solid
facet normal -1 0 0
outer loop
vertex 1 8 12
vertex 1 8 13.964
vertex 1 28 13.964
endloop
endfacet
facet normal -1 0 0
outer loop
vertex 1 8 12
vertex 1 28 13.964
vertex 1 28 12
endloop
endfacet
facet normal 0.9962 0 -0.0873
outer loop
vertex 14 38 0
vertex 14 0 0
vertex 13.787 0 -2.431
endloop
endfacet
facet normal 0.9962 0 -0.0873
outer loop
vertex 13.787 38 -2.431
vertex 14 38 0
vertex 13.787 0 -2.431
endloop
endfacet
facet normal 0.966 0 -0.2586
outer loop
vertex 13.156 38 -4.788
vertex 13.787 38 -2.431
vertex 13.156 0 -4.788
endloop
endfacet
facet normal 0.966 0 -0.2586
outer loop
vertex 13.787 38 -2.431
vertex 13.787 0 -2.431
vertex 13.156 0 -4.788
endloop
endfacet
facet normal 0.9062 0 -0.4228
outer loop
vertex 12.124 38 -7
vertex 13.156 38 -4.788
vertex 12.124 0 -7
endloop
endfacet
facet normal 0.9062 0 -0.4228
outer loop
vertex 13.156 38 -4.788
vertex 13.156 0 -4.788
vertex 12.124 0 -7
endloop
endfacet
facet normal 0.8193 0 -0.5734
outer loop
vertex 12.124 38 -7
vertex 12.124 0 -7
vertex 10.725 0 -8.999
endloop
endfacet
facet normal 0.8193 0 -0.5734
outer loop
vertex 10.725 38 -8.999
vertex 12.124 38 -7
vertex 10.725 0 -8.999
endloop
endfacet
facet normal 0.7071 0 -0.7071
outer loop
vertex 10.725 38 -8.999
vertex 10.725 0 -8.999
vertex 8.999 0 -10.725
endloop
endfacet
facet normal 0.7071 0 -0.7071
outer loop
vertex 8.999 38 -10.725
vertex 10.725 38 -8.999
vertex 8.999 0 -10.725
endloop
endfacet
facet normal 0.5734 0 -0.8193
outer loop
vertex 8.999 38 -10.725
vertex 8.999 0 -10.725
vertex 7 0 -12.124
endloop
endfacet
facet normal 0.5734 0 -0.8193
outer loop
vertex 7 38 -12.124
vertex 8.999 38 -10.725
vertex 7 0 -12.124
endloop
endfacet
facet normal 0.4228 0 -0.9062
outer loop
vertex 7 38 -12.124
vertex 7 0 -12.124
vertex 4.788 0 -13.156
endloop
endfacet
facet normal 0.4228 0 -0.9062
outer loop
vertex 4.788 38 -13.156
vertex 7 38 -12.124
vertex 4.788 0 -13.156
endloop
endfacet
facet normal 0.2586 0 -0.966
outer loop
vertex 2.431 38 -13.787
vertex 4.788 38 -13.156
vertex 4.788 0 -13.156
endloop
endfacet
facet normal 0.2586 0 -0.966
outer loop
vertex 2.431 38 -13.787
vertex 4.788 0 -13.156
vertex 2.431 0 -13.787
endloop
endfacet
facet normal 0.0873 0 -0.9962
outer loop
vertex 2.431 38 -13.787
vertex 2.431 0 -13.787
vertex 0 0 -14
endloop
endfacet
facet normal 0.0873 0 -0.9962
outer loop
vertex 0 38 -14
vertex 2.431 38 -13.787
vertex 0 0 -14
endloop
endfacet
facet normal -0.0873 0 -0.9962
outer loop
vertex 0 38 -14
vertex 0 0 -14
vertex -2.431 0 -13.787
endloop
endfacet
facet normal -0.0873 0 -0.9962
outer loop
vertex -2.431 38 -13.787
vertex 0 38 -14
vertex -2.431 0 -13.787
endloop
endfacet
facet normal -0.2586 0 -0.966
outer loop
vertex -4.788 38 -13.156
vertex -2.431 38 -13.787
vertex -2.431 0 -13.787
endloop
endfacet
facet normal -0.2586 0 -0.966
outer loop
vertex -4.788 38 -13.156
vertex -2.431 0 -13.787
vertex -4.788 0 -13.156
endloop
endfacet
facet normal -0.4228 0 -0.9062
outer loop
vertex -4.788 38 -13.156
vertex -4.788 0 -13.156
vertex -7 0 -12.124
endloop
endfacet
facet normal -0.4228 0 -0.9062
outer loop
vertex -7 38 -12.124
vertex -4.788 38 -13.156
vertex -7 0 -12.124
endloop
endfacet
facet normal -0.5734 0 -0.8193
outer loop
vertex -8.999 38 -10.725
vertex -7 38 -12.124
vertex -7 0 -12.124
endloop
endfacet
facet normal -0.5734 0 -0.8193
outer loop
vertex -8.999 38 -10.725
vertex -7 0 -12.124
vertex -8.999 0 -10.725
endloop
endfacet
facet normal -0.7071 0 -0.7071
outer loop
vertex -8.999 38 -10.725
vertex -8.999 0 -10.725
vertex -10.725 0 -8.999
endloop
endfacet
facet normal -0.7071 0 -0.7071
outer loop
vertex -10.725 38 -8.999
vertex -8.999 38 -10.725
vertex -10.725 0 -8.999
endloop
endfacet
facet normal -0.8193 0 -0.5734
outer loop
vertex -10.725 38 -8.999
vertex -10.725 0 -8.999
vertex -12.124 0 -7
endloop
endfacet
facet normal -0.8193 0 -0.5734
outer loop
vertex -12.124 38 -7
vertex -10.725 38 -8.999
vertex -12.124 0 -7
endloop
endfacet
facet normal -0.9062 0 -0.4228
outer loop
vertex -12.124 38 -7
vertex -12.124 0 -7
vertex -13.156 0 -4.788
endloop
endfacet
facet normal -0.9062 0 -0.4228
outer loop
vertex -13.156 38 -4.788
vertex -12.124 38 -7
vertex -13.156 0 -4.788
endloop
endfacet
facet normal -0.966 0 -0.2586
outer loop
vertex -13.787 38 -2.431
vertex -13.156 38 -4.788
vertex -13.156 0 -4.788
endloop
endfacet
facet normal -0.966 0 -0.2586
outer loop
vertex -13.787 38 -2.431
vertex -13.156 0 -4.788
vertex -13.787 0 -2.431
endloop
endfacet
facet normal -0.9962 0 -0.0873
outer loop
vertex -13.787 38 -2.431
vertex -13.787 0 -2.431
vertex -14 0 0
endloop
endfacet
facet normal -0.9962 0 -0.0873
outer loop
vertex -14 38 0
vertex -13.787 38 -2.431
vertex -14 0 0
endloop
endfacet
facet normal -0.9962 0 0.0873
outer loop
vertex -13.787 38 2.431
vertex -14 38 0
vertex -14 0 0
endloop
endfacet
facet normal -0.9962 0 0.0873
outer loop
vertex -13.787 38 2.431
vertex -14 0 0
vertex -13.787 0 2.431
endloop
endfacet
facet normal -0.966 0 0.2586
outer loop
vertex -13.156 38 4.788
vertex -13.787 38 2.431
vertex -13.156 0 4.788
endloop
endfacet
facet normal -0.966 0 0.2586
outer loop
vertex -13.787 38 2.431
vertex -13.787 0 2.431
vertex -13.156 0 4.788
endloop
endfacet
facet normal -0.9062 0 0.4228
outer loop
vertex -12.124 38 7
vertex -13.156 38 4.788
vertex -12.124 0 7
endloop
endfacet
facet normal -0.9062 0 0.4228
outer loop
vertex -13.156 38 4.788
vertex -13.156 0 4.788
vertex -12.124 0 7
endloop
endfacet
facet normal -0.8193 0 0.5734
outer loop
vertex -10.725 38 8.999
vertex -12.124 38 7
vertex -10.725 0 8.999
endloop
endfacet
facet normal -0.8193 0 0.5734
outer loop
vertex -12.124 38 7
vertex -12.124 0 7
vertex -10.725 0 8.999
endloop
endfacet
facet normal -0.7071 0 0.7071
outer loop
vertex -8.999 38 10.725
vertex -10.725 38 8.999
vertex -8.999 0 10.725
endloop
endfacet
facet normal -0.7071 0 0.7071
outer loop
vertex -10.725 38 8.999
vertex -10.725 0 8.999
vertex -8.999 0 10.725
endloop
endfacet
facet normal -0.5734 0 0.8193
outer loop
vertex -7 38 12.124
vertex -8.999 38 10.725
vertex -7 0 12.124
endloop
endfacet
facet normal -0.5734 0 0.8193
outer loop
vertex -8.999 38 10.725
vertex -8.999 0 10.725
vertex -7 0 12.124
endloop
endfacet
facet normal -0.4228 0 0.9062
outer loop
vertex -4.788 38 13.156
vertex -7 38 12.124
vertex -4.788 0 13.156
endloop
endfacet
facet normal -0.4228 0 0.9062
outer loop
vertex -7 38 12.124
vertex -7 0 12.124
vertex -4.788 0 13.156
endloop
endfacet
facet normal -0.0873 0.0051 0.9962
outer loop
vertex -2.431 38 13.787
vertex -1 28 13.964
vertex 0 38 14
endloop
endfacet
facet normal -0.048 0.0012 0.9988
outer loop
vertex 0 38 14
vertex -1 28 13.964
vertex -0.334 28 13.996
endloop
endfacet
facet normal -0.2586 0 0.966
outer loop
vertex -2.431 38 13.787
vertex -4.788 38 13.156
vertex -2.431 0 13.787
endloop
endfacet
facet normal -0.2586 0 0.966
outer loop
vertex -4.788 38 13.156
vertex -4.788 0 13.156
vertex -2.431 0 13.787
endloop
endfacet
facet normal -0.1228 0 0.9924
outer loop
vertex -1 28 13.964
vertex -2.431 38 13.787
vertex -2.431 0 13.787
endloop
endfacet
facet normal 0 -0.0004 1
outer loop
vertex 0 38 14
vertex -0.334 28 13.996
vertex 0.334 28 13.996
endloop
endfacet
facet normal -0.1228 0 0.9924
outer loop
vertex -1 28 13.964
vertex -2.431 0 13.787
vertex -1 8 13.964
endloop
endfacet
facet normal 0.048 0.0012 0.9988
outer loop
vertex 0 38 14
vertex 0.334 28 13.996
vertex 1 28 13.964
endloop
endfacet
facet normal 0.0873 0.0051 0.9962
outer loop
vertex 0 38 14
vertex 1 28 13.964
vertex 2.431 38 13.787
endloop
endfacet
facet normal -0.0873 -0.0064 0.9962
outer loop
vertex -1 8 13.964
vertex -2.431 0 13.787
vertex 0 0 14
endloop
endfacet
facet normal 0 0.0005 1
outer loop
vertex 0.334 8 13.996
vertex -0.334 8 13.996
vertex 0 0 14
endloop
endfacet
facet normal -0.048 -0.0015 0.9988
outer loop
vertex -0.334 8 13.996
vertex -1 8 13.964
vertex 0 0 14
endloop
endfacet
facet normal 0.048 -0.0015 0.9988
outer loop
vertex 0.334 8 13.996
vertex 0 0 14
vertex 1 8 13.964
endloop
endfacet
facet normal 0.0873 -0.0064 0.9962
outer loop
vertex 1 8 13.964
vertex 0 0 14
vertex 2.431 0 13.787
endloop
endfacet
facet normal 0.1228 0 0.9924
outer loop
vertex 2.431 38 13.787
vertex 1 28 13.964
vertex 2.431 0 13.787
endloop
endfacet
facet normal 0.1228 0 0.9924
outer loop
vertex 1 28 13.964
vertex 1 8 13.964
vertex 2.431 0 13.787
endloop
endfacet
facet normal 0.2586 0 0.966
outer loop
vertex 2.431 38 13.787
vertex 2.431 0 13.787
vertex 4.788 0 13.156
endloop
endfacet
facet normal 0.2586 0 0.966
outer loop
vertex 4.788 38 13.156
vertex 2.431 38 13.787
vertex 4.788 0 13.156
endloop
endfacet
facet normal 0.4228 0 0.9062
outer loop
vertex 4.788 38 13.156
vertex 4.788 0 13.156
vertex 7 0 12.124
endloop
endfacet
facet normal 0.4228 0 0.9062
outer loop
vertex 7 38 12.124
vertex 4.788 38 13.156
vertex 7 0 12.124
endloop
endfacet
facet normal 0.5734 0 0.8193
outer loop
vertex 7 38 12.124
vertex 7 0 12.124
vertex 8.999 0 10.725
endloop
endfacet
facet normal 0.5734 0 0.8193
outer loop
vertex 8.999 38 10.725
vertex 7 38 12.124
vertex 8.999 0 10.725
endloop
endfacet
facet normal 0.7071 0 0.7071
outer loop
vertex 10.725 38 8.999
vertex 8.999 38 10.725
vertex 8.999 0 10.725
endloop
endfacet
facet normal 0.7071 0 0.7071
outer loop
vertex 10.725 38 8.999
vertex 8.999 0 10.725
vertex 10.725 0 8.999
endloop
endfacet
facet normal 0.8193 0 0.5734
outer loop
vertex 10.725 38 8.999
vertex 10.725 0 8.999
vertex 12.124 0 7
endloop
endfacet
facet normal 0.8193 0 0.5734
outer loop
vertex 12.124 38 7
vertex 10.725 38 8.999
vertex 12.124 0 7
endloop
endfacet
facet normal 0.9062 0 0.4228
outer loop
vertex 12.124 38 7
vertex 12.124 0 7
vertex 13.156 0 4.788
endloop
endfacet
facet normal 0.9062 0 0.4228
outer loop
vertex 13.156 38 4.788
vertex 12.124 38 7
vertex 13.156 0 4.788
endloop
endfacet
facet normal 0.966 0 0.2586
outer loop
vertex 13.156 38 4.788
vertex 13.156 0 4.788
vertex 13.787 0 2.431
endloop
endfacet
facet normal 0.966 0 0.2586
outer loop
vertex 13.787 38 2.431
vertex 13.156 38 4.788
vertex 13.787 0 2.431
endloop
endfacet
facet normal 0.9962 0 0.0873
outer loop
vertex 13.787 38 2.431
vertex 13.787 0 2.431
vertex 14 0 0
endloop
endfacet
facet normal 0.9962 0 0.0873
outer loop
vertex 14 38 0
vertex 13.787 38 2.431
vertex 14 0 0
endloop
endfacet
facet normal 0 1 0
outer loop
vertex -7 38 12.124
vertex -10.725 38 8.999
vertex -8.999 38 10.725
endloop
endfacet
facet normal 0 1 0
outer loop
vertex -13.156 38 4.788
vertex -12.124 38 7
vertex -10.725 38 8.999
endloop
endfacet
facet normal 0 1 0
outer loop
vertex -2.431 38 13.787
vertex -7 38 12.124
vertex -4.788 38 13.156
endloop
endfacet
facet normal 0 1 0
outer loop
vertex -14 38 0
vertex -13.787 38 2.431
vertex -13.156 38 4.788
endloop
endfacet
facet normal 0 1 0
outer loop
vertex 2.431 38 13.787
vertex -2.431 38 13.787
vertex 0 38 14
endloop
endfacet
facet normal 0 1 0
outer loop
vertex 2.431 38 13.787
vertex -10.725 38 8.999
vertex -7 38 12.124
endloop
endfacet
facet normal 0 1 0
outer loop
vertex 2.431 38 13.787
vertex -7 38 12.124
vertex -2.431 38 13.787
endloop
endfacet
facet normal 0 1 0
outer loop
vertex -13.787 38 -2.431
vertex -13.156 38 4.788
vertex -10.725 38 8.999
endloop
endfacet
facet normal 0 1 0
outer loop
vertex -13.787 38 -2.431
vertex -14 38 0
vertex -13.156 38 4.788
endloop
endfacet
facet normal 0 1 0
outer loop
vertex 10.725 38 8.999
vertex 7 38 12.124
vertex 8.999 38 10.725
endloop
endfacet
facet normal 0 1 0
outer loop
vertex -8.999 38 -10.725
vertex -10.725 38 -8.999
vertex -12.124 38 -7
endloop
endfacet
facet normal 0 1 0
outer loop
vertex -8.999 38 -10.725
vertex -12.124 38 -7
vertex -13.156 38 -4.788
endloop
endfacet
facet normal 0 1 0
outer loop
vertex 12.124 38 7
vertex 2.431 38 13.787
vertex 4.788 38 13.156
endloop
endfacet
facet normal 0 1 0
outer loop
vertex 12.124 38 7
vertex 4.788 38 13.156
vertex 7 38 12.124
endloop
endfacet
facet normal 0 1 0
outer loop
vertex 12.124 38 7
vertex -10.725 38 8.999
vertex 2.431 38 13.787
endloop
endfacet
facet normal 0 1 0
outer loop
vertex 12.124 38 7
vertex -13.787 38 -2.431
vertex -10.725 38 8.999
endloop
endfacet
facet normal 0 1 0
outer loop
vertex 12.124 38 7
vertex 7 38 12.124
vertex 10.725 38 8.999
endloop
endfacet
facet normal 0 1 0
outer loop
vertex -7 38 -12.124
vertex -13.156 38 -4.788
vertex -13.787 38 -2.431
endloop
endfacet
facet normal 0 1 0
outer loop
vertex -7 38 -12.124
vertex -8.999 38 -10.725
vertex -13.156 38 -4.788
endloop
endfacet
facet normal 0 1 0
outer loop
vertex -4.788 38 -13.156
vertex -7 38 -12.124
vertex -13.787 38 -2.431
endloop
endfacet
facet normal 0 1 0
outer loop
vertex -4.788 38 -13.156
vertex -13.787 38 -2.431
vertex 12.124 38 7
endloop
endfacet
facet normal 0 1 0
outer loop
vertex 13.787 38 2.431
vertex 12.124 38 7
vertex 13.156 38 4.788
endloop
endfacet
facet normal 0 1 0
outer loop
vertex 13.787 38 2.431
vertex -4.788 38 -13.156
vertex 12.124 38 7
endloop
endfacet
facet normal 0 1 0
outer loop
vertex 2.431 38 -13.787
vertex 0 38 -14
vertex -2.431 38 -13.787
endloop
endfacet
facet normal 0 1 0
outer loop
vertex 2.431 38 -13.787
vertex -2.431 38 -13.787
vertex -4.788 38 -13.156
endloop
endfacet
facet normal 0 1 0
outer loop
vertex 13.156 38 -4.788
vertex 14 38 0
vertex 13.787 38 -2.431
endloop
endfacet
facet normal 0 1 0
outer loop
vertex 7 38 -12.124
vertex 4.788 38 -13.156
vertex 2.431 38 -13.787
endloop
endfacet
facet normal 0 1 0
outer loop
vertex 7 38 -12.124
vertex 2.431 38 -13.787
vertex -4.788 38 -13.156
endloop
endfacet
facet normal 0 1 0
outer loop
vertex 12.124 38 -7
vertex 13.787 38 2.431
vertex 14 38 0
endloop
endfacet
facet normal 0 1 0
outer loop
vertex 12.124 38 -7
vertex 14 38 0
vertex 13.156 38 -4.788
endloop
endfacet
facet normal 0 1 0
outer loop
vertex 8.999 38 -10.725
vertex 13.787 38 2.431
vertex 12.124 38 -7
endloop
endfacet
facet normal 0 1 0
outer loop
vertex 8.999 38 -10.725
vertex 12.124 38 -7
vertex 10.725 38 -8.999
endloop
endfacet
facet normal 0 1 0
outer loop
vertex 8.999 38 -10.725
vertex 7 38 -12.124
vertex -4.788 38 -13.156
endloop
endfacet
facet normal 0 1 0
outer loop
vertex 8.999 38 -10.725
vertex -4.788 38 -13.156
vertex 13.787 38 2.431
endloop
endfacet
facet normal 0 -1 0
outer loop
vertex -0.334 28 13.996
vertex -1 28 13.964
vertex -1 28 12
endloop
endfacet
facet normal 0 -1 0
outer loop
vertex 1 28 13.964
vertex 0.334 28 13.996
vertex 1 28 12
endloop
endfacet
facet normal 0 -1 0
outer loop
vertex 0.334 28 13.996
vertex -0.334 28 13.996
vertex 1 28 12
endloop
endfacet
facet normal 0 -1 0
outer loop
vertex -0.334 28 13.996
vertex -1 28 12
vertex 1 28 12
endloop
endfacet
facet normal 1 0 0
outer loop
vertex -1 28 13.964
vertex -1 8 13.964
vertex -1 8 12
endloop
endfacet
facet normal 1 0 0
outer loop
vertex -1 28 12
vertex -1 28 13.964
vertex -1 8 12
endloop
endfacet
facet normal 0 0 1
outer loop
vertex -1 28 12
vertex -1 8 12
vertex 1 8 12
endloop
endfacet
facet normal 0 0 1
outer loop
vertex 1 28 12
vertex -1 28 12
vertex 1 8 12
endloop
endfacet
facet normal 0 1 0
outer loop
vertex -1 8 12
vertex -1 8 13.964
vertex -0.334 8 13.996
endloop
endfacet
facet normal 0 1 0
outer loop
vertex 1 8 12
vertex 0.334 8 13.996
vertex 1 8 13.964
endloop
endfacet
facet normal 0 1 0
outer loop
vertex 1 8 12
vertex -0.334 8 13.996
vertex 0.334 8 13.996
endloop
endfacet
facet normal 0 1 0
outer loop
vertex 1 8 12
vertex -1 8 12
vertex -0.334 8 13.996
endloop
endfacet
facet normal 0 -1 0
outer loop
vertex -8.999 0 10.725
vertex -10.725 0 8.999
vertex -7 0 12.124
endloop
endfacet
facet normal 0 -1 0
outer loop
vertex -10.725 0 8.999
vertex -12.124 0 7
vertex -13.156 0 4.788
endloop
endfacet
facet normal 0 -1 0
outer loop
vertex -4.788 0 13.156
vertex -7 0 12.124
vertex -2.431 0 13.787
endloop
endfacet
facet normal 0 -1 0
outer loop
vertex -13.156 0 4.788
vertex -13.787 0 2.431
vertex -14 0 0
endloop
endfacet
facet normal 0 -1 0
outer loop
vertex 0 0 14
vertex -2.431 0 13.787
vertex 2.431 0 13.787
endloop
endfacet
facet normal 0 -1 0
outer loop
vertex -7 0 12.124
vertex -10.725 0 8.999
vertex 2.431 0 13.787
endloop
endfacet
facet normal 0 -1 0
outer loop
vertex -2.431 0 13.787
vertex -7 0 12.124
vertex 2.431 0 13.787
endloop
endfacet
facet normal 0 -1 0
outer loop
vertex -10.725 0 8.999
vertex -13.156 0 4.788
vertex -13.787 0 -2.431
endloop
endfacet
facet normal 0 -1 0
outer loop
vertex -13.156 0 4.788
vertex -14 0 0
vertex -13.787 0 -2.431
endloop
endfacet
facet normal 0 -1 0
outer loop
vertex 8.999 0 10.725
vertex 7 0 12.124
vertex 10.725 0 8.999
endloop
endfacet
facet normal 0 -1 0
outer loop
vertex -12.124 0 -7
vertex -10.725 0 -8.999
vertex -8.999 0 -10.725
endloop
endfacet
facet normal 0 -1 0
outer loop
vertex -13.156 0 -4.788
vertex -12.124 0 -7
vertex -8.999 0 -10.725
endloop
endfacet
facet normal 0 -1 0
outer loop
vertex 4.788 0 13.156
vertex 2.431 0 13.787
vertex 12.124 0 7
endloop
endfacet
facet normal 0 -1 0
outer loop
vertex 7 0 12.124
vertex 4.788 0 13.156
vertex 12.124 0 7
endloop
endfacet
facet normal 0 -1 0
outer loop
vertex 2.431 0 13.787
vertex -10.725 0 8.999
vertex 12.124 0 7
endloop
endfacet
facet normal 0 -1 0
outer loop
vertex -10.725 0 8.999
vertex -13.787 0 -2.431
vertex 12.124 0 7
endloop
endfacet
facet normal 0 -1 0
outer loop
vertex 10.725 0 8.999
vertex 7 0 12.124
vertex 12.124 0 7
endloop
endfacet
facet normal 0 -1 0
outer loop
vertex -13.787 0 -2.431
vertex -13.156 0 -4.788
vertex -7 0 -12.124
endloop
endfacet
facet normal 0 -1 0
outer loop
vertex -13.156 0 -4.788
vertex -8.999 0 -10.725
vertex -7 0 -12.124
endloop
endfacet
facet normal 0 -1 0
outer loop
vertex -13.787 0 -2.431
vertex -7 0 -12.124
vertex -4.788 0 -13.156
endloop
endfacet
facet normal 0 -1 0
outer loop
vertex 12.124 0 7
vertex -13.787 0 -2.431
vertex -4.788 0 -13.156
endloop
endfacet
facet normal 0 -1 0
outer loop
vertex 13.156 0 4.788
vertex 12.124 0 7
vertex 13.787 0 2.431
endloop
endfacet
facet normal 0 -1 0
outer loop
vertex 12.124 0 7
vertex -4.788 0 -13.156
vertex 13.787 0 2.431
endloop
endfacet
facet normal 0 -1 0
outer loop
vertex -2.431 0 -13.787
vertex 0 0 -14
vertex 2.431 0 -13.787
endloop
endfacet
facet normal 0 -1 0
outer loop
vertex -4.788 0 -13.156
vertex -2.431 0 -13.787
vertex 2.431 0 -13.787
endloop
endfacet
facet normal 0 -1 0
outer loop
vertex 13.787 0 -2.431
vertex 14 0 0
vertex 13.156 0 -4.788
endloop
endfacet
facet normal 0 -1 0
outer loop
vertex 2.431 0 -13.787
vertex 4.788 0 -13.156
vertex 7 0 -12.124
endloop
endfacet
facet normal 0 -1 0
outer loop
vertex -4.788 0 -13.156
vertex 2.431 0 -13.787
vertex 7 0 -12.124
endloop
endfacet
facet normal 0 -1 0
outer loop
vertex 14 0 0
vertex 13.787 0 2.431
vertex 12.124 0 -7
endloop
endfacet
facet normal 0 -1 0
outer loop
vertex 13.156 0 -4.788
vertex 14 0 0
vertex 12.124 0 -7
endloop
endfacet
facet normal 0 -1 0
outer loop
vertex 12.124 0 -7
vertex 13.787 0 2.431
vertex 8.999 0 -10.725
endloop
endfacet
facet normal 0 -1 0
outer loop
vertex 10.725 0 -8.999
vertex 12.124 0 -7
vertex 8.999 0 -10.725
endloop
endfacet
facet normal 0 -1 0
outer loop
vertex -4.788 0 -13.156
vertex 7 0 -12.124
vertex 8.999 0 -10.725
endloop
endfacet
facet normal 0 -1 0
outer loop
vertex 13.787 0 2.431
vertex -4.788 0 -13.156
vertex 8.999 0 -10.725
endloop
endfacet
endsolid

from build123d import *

# Parameters (mm, degrees)
SKETCH1_R           = 14
BOSS_EXTRUDE1_DEPTH = 38
CUT_EXTRUDE1_START  = 8
SKETCH2_W           = 2
SKETCH2_H           = 3
CUT_EXTRUDE1_DEPTH  = 20


with BuildPart() as part:
    # Sketch1 → Boss-Extrude1 (new body)
    with BuildSketch(Plane(origin=(0, 0, 0), x_dir=(1, 0, 0), z_dir=(0, 1, 0))):
        Circle(SKETCH1_R)
    extrude(amount=BOSS_EXTRUDE1_DEPTH)

    # Sketch2 → Cut-Extrude1 (cut)
    with BuildSketch(Plane(origin=(0, 0, 0), x_dir=(1, 0, 0), z_dir=(0, 1, 0)).offset(CUT_EXTRUDE1_START)):
        with Locations((0, -13.5)):
            Rectangle(SKETCH2_W, SKETCH2_H)
    extrude(amount=CUT_EXTRUDE1_DEPTH, mode=Mode.SUBTRACT)


solid = part.part
